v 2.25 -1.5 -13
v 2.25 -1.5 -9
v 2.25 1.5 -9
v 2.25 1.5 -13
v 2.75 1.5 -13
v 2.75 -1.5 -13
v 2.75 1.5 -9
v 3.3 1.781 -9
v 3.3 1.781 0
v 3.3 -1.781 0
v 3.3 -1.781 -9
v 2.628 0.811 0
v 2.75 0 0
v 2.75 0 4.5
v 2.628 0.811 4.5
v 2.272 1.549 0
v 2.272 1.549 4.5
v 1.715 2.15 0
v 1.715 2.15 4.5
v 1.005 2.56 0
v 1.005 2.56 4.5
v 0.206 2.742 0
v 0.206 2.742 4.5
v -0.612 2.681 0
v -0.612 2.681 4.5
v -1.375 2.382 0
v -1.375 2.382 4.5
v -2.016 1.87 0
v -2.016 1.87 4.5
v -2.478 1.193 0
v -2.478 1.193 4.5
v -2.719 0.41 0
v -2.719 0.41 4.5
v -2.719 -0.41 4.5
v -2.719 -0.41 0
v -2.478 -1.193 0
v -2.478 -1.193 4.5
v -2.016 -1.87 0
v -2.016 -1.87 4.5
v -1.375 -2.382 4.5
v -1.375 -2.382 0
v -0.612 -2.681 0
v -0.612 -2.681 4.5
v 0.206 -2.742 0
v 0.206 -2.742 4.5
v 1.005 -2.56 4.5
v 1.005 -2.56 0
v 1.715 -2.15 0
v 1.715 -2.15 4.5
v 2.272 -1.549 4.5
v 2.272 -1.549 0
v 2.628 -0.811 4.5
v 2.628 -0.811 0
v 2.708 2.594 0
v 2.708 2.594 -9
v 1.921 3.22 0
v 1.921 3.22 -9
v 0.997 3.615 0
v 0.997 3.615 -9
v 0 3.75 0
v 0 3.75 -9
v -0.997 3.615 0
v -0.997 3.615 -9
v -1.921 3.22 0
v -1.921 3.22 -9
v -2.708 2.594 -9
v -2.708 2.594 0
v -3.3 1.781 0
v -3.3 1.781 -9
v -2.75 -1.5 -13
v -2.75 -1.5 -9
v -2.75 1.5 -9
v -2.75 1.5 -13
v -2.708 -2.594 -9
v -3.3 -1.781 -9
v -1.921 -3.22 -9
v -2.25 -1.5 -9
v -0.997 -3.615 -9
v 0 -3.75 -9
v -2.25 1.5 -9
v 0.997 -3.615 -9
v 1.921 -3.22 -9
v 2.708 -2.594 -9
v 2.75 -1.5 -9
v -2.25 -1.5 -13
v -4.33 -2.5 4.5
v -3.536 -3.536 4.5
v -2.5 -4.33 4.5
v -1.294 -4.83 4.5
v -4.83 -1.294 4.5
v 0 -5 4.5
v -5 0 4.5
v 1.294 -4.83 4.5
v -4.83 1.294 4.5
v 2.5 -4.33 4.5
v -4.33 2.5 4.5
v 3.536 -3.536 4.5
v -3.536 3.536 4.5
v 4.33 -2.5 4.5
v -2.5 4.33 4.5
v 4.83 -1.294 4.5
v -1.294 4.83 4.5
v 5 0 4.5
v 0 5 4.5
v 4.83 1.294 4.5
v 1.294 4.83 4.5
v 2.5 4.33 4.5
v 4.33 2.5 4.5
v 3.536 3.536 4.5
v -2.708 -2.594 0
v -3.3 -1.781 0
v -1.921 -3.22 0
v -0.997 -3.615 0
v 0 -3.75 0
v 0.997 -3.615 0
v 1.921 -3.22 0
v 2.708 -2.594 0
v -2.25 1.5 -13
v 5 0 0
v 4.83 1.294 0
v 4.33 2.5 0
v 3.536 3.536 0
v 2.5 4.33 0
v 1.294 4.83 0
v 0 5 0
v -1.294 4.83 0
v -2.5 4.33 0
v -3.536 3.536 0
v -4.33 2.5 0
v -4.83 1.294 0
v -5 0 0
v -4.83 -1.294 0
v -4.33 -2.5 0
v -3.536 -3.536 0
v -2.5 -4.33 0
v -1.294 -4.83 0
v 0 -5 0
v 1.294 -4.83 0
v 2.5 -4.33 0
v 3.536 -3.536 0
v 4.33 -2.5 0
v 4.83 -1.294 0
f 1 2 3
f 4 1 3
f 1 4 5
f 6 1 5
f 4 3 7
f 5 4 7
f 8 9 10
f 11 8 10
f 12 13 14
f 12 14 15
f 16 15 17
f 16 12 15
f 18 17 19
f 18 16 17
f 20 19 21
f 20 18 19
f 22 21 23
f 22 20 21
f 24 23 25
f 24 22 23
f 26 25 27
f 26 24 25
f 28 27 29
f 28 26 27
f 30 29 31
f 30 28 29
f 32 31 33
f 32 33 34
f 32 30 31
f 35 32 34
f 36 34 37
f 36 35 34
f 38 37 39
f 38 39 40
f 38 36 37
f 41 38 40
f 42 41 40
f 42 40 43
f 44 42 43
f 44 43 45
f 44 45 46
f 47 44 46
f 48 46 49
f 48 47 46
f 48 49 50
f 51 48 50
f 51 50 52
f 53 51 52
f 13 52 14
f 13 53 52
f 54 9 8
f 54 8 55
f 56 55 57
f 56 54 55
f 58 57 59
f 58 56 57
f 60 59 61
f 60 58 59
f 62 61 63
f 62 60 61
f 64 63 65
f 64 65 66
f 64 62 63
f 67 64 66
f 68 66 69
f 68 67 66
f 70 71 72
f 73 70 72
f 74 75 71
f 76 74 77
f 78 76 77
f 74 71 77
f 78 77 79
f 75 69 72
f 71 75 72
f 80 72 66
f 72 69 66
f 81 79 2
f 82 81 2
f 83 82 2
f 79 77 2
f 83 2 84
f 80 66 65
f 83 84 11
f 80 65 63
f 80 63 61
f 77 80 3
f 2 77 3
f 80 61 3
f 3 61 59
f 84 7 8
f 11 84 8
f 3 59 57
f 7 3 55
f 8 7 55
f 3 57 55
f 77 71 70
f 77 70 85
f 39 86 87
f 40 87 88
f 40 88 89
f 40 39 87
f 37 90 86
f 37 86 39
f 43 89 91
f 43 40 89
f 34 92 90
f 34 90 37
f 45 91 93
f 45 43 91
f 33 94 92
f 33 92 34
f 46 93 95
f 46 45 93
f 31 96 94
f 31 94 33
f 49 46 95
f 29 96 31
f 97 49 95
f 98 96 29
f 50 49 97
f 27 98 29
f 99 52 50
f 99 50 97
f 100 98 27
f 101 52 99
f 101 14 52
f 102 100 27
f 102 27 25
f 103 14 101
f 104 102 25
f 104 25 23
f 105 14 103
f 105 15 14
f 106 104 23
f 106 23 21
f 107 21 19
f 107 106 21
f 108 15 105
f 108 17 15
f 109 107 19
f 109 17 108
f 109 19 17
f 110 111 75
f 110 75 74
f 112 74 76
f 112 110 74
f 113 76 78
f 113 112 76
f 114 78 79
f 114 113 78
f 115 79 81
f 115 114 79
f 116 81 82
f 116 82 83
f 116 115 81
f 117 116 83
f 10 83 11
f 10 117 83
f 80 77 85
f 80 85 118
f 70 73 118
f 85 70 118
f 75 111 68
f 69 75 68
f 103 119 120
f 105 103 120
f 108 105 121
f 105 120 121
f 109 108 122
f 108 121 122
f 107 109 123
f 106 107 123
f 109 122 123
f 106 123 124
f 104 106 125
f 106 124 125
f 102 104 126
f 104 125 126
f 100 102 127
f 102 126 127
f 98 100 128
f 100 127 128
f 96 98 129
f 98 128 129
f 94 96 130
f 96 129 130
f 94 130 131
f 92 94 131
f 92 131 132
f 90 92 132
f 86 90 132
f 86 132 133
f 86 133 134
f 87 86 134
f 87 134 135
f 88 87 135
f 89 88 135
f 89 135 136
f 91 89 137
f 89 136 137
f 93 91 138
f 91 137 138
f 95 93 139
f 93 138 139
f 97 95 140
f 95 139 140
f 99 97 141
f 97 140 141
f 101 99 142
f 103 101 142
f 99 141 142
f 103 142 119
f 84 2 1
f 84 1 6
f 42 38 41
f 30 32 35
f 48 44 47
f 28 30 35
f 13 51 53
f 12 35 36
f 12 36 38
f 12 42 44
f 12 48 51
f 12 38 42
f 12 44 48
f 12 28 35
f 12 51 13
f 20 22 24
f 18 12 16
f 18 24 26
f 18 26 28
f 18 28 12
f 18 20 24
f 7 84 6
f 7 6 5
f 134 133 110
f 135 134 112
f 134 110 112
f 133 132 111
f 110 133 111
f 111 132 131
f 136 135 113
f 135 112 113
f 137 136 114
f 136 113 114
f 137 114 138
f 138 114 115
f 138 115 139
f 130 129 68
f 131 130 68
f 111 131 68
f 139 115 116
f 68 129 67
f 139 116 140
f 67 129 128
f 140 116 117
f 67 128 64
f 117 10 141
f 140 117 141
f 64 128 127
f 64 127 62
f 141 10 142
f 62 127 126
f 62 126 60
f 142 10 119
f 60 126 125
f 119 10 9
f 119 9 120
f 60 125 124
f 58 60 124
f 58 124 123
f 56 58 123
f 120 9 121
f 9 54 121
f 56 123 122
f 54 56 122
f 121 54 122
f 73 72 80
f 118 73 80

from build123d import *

# Parameters (mm, degrees)
SKETCH083_R   = 5
SKETCH083_R_2 = 2.75
PAD063_DEPTH  = 4.5
PAD064_DEPTH  = 9
SKETCH085_W   = 0.5
SKETCH085_H   = 3
PAD065_DEPTH  = 4


with BuildPart() as part:
    # Sketch083 → Pad063 (new body)
    with BuildSketch(Plane.XY):
        Circle(SKETCH083_R)
        Circle(SKETCH083_R_2, mode=Mode.SUBTRACT)
    extrude(amount=PAD063_DEPTH)

    # Sketch084 → Pad064 (join)
    with BuildSketch(Plane.XY):
        with BuildLine():
            ThreePointArc((3.3, 1.781151), (0, 3.75), (-3.3, 1.781151))
            Line((-3.3, -1.781151), (-3.3, 1.781151))
            ThreePointArc((-3.3, -1.781151), (0, -3.75), (3.3, -1.781151))
            Line((3.3, 1.781151), (3.3, -1.781151))
        make_face()
    extrude(amount=-PAD064_DEPTH)

    # Sketch085 → Pad065 (join)
    with BuildSketch(Plane.XY.offset(-9)):
        with Locations((-2.5, 0)):
            Rectangle(SKETCH085_W, SKETCH085_H)
        with Locations((2.5, 0)):
            Rectangle(SKETCH085_W, SKETCH085_H)
    extrude(amount=-PAD065_DEPTH)


solid = part.part
